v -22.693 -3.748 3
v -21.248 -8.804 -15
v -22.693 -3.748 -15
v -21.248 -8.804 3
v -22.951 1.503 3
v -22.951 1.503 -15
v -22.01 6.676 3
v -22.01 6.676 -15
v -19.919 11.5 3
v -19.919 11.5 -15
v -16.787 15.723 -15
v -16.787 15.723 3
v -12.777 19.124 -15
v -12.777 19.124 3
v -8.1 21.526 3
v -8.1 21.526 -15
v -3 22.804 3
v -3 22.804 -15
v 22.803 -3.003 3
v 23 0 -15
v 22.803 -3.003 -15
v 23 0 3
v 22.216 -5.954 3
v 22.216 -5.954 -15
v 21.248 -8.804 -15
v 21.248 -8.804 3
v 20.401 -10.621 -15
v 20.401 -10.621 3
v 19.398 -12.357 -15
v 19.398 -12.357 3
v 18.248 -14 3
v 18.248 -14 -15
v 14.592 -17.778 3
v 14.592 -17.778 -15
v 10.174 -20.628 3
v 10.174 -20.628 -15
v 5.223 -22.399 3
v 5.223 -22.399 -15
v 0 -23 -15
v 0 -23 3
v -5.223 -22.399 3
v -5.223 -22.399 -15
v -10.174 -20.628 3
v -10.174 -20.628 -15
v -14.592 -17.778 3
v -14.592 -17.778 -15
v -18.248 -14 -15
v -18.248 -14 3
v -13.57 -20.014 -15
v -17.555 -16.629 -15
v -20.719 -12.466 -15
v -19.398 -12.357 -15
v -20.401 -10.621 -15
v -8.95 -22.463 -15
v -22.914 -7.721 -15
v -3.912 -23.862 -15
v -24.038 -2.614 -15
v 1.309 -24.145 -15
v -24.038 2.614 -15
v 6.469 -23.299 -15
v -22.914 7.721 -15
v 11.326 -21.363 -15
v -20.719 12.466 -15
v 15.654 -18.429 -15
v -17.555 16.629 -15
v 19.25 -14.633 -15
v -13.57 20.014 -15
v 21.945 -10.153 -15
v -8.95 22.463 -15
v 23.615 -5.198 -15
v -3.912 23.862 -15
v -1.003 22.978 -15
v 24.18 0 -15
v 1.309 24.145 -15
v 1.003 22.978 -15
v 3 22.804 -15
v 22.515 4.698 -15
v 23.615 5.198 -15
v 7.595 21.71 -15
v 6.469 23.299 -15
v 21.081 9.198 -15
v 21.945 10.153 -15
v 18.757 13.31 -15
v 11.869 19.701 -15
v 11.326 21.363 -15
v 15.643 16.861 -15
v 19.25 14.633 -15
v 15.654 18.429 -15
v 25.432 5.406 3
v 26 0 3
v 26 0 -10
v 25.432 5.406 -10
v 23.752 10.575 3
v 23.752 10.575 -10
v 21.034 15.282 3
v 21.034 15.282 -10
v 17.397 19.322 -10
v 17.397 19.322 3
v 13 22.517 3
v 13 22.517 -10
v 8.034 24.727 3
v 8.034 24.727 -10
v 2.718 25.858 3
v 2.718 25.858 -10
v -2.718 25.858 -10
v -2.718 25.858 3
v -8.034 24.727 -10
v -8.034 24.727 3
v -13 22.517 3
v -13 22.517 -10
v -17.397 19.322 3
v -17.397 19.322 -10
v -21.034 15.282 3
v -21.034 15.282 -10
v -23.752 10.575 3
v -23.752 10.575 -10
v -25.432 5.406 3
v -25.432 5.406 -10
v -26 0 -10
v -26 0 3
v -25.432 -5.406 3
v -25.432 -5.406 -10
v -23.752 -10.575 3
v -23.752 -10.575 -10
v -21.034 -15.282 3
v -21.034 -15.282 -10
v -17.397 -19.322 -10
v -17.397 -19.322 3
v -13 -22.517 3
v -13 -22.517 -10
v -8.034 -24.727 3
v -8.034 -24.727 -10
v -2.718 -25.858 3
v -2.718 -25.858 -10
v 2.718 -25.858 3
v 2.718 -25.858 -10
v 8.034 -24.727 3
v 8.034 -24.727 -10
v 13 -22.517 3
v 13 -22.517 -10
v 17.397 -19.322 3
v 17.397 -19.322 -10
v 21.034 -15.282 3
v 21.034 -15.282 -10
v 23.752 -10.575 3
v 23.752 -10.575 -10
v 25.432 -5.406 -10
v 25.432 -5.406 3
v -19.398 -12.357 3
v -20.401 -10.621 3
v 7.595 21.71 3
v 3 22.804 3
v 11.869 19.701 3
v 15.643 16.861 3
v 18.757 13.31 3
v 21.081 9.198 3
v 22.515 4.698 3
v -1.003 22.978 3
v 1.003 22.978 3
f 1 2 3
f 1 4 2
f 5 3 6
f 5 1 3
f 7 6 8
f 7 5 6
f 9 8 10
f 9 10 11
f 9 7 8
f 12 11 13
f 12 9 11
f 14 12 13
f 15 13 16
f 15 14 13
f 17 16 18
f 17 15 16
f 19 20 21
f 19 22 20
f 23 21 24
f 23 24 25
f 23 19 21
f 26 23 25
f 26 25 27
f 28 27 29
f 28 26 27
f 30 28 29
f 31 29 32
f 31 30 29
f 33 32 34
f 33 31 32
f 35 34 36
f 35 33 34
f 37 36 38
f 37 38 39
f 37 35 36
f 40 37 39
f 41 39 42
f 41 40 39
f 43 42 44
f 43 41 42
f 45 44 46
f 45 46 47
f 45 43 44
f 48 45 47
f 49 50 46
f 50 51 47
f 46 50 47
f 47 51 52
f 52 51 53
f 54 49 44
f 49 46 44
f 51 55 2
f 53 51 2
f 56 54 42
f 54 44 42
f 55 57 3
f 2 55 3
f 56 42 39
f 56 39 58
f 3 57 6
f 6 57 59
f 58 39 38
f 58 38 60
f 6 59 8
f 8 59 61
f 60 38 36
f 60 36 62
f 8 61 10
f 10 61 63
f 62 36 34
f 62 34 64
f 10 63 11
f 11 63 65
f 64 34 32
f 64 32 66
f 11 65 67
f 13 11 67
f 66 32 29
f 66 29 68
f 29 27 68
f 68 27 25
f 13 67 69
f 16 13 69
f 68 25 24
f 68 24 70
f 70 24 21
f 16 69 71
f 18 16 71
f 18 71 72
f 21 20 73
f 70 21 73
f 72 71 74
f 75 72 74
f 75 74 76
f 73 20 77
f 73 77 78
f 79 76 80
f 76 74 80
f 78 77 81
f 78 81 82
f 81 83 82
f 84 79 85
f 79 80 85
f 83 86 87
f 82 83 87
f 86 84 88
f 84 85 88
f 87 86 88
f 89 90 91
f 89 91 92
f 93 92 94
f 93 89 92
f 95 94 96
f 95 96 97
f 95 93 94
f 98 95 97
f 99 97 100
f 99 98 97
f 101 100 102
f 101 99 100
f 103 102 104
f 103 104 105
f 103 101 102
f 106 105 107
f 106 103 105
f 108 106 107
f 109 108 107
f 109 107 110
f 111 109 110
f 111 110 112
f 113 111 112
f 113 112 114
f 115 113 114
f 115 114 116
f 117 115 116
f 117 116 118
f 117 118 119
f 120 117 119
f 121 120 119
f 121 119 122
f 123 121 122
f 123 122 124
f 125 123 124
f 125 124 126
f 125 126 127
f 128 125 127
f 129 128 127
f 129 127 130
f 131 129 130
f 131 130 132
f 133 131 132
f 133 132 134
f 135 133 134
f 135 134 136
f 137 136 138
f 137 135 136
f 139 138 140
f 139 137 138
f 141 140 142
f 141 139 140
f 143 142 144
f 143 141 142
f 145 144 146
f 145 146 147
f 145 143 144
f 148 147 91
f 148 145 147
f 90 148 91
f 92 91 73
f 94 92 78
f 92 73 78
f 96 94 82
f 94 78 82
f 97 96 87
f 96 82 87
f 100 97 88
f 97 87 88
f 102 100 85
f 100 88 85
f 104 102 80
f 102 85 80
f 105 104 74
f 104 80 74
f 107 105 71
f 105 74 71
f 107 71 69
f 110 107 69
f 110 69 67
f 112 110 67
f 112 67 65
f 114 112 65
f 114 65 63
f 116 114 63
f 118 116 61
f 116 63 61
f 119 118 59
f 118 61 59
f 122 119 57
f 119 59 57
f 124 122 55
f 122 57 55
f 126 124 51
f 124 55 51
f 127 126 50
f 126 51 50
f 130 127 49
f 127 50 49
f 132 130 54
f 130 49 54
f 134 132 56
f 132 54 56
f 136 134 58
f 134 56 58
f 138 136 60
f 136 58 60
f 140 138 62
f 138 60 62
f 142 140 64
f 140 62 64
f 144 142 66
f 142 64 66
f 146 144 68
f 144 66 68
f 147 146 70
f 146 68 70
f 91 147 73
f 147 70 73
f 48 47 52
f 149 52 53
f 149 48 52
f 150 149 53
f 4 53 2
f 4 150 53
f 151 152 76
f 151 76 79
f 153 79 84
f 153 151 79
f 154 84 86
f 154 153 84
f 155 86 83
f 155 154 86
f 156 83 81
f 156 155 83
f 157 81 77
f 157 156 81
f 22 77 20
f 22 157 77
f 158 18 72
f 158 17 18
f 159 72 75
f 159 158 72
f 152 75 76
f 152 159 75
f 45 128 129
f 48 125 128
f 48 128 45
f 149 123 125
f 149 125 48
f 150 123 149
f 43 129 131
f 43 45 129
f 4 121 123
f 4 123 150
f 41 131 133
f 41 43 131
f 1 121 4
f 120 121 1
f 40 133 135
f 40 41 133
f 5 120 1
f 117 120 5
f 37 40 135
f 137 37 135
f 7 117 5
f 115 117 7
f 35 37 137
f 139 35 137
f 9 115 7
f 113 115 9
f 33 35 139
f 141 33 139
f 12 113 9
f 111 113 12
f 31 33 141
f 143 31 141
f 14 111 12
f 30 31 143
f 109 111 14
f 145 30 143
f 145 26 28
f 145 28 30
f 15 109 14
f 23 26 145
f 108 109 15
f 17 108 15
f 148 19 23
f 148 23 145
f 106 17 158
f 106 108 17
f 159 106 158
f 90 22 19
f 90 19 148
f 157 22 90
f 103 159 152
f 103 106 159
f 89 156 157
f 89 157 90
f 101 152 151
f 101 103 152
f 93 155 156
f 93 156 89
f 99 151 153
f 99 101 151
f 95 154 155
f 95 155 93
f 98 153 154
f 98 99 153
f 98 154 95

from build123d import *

# Parameters (mm, degrees)
F0_R     = 26
F1_DEPTH = 3
F2_DEPTH = 15
F3_SIZE2 = 1.819851
F3_SIZE  = 5


with BuildPart() as f1:
    # F0 (on Top) → F1 (new body)
    with BuildSketch(Plane.XY):
        Circle(F0_R)
        with BuildLine():
            ThreePointArc((3, 22.803509), (17.291616, 15.165751), (23, 0))
            ThreePointArc((23, 0), (22.557855, -4.488117), (21.248418, -8.803678))
            ThreePointArc((21.248418, -8.803678), (19.918584, -11.5), (18.248418, -13.99983))
            ThreePointArc((18.248418, -13.99983), (0, -23), (-18.248418, -13.99983))
            ThreePointArc((-18.248418, -13.99983), (-19.918584, -11.5), (-21.248418, -8.803678))
            ThreePointArc((-21.248418, -8.803678), (-19.918584, 11.5), (-3, 22.803509))
            ThreePointArc((-3, 22.803509), (0, 23), (3, 22.803509))
        make_face(mode=Mode.SUBTRACT)
    extrude(amount=F1_DEPTH)

    # F0 (on Top) → F2 (join)
    with BuildSketch(Plane.XY):
        Circle(F0_R)
        with BuildLine():
            ThreePointArc((3, 22.803509), (17.291616, 15.165751), (23, 0))
            ThreePointArc((23, 0), (22.557855, -4.488117), (21.248418, -8.803678))
            ThreePointArc((21.248418, -8.803678), (19.918584, -11.5), (18.248418, -13.99983))
            ThreePointArc((18.248418, -13.99983), (0, -23), (-18.248418, -13.99983))
            ThreePointArc((-18.248418, -13.99983), (-19.918584, -11.5), (-21.248418, -8.803678))
            ThreePointArc((-21.248418, -8.803678), (-19.918584, 11.5), (-3, 22.803509))
            ThreePointArc((-3, 22.803509), (0, 23), (3, 22.803509))
        make_face(mode=Mode.SUBTRACT)
    extrude(amount=-F2_DEPTH)

    # F3
    f3_edges = [f1.edges().sort_by_distance(p)[0] for p in [
        (-26, 0, -15),
    ]]
    chamfer(f3_edges, length=F3_SIZE, length2=F3_SIZE2)


solid = f1.part
